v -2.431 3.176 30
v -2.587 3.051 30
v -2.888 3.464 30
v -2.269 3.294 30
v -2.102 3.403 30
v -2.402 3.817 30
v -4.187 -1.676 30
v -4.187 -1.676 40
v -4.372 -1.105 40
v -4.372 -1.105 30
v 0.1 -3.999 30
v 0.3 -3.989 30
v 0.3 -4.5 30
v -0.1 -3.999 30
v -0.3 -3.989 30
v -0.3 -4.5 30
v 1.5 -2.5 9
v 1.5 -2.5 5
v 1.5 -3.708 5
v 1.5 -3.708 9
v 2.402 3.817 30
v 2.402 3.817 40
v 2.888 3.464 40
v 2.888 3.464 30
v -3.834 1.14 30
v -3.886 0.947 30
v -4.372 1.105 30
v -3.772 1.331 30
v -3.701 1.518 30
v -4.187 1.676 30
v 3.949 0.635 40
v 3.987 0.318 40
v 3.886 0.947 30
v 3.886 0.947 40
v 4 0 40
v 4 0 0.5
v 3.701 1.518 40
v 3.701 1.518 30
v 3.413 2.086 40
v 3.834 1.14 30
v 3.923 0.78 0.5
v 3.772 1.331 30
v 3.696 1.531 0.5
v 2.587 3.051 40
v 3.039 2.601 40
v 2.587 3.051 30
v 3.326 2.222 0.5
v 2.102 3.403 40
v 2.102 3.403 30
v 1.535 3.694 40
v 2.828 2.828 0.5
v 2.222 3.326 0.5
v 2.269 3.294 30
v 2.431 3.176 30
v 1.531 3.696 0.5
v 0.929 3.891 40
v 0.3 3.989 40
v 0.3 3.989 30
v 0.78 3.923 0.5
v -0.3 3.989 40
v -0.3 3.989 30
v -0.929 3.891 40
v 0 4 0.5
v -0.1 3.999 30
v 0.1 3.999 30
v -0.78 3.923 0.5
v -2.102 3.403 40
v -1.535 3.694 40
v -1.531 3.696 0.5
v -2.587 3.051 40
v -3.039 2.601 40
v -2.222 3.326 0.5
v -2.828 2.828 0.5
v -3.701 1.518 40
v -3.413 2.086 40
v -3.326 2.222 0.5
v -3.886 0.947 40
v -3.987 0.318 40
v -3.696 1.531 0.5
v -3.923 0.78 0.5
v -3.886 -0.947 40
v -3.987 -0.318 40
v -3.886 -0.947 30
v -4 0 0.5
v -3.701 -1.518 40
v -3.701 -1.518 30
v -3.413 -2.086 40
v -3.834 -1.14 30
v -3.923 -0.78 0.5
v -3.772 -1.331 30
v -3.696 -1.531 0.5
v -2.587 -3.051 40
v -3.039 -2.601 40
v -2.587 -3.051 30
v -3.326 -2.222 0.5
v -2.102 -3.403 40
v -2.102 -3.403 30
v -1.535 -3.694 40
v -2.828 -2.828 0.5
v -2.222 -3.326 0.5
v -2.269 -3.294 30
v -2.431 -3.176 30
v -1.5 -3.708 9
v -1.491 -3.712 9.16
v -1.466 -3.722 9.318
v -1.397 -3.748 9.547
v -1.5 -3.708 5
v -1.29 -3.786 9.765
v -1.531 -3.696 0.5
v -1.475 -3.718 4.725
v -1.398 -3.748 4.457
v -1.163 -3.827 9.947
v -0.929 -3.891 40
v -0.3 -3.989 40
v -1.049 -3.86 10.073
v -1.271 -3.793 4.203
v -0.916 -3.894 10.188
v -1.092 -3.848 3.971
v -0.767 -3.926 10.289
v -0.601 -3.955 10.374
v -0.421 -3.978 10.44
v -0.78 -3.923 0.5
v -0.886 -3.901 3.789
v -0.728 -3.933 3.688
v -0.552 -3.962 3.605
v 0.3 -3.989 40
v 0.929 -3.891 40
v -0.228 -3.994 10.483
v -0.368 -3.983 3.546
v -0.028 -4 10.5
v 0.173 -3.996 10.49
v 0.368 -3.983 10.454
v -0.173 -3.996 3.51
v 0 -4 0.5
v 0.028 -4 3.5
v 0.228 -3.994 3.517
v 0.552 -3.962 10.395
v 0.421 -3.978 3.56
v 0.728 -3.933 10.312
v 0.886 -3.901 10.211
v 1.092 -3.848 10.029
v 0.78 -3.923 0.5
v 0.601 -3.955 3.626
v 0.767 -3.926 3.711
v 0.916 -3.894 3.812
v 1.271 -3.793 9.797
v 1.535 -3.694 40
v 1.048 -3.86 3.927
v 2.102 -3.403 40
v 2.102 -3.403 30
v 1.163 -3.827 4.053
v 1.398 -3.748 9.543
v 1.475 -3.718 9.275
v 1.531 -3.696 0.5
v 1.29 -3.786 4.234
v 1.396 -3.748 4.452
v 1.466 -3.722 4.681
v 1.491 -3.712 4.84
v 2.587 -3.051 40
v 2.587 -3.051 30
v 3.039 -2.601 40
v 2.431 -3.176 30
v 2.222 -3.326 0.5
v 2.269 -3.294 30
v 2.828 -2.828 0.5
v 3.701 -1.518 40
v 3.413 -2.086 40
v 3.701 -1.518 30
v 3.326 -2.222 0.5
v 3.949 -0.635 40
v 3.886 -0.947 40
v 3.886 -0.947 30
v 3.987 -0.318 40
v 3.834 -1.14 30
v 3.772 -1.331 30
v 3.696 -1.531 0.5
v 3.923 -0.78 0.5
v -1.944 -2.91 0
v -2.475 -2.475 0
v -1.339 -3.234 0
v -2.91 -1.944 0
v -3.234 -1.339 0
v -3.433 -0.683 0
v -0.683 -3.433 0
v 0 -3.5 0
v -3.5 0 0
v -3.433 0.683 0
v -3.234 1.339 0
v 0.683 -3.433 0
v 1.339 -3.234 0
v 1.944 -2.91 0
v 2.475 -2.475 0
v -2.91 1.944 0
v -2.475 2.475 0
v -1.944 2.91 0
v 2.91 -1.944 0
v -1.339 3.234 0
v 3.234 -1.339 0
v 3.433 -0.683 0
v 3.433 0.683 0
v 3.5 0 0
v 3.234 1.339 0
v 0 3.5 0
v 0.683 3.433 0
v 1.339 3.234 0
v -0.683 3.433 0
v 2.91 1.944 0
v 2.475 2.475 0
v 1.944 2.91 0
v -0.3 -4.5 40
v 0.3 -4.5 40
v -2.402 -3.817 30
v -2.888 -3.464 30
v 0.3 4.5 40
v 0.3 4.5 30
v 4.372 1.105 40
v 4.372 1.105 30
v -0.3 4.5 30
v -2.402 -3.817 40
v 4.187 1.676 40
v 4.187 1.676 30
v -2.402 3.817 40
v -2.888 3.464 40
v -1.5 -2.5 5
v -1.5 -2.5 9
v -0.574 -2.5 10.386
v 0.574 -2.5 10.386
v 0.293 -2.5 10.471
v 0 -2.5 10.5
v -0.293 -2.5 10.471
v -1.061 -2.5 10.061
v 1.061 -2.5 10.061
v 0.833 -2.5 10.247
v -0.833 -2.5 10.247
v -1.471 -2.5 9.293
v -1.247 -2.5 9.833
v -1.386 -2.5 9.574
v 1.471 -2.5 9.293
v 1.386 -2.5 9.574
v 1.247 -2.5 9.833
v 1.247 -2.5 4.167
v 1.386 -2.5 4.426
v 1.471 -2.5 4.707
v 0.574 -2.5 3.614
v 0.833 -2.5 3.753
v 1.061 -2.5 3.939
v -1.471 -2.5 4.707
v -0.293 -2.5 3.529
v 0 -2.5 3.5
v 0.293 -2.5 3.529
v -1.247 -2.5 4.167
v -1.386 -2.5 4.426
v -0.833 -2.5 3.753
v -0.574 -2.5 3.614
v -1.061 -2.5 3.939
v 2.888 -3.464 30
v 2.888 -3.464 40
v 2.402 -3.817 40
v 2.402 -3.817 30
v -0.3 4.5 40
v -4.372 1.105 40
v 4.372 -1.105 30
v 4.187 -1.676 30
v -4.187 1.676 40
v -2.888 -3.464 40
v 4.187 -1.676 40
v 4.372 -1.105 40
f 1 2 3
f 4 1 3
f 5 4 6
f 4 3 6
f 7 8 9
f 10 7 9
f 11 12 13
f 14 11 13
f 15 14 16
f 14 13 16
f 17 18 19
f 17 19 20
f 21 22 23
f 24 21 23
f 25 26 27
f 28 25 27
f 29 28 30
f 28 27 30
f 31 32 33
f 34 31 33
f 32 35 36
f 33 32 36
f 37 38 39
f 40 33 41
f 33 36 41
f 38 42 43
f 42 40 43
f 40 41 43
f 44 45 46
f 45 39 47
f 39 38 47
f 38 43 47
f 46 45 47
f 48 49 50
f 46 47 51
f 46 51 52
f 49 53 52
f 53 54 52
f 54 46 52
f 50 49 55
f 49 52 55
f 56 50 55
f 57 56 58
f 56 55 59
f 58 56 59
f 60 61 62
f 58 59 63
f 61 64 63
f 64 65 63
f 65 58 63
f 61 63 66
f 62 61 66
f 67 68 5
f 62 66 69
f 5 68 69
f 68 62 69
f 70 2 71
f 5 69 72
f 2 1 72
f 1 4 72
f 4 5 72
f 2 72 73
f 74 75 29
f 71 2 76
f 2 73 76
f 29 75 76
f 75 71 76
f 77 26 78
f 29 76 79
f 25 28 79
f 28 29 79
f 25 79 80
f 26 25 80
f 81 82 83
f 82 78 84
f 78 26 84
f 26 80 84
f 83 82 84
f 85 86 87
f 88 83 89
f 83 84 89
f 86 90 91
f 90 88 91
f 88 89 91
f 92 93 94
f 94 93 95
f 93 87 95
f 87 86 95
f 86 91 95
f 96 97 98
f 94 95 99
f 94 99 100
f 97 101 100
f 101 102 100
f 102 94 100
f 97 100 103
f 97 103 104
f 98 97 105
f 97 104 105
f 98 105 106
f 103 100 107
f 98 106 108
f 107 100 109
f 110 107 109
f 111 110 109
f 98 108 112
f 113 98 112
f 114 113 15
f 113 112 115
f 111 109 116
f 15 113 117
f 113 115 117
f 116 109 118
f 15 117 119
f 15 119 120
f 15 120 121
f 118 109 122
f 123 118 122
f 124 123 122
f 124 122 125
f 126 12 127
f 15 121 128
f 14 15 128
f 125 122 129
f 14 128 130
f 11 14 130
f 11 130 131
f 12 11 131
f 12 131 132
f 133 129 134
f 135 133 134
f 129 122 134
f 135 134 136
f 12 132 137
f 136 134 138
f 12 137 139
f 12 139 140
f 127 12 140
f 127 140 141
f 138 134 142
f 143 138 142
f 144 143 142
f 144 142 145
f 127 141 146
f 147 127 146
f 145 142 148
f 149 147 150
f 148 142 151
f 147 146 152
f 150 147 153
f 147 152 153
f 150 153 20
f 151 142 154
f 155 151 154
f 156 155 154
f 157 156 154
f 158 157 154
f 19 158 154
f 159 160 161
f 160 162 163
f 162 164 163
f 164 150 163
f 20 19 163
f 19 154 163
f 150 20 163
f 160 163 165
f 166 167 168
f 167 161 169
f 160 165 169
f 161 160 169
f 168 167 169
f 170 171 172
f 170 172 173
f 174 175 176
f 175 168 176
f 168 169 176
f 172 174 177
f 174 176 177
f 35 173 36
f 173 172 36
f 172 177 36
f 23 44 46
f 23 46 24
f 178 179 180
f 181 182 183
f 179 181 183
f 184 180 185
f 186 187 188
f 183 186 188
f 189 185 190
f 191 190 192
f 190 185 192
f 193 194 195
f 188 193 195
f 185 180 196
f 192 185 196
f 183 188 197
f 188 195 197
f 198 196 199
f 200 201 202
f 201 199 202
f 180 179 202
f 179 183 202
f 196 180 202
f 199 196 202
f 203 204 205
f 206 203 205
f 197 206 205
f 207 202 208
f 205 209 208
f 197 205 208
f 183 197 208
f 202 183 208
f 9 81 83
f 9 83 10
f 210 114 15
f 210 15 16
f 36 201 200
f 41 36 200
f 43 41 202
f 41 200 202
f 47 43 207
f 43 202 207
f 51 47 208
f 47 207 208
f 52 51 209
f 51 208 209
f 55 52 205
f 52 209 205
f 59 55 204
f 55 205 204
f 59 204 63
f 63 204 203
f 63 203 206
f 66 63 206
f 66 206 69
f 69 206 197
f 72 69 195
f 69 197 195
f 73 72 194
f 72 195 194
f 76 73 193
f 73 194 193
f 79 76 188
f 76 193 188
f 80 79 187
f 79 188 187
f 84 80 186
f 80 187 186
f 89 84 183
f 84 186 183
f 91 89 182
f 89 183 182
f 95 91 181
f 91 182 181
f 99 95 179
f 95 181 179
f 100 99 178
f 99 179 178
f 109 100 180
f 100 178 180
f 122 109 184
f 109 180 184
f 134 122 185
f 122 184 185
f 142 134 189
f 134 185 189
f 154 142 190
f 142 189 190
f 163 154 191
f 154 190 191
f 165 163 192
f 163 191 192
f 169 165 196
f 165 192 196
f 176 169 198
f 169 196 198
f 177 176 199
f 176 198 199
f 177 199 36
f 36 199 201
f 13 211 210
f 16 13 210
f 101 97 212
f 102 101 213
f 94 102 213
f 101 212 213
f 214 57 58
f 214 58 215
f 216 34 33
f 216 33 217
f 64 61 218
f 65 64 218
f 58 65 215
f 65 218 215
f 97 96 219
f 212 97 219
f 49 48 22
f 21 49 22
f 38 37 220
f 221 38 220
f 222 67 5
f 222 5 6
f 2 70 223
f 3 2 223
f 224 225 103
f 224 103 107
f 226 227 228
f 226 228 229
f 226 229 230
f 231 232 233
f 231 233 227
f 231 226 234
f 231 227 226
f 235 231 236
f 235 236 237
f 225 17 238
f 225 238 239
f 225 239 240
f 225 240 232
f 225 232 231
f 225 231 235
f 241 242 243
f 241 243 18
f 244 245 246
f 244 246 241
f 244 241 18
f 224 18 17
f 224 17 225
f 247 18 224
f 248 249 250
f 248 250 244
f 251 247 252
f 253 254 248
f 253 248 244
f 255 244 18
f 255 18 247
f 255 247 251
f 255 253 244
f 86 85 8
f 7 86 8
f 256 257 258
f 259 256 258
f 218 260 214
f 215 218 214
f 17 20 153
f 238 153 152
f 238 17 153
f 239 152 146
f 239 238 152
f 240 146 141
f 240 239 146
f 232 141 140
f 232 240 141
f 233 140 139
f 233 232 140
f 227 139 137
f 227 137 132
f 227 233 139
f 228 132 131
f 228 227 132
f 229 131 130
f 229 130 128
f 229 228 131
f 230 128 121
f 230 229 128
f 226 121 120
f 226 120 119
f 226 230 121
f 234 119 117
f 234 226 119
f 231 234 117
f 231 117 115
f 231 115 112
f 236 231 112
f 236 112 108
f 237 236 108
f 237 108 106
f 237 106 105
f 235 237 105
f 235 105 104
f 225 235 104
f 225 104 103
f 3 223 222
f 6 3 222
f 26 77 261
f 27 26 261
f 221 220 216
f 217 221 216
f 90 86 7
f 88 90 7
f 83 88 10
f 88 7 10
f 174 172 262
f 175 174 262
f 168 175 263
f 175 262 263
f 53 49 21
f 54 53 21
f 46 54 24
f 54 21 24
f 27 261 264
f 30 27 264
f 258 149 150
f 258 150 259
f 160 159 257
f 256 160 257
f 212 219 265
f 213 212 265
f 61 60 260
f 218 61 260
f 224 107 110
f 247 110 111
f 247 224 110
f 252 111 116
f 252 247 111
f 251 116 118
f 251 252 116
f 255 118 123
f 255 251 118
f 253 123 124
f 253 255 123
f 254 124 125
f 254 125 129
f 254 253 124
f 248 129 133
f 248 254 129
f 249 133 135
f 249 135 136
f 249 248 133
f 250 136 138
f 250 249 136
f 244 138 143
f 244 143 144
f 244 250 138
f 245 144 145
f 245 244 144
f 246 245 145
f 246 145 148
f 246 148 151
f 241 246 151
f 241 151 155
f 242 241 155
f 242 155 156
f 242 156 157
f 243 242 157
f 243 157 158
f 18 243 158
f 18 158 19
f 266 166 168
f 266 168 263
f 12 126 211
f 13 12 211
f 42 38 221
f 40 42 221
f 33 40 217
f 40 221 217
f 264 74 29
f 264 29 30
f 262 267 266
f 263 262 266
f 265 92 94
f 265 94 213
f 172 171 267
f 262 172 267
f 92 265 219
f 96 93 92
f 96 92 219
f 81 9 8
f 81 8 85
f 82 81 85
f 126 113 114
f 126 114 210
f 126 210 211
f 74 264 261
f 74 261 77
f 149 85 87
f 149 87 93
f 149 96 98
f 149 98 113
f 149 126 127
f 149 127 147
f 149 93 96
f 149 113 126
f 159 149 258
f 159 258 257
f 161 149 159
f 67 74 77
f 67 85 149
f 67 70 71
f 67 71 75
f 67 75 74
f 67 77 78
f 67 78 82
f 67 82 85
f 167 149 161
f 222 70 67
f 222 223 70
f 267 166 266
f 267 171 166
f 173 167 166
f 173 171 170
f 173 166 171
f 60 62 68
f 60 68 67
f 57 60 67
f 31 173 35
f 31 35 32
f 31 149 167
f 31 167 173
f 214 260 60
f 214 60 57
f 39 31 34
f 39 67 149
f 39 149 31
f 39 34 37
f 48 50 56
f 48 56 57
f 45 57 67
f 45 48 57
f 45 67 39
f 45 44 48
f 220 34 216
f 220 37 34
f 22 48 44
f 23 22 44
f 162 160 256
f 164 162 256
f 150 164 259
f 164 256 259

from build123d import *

# Parameters (mm, degrees)
SKETCH1_R           = 4
BOSS_EXTRUDE1_DEPTH = 40
CUT_EXTRUDE1_START  = -2.5
CUT_EXTRUDE1_DEPTH  = 2.5
SKETCH3_W           = 0.6
SKETCH3_H           = 2.558346845
BOSS_EXTRUDE2_DEPTH = 10
CIRPATTERN1_COUNT   = 10
CHAMFER1_SIZE       = 0.5


with BuildPart() as part:
    # Sketch1 → Boss-Extrude1 (new body)
    with BuildSketch(Plane.XY):
        Circle(SKETCH1_R)
    extrude(amount=BOSS_EXTRUDE1_DEPTH)

    # Sketch2 → Cut-Extrude1 (cut, through all)
    with BuildSketch(Plane(origin=(0, 0, 0), x_dir=(1, 0, 0), z_dir=(0, 1, 0)).offset(CUT_EXTRUDE1_START)):
        with BuildLine():
            Line((1.5, -5), (1.5, -9))
            ThreePointArc((1.5, -9), (0, -10.5), (-1.5, -9))
            Line((-1.5, -9), (-1.5, -5))
            ThreePointArc((-1.5, -5), (0, -3.5), (1.5, -5))
        make_face()
    extrude(amount=-CUT_EXTRUDE1_DEPTH, mode=Mode.SUBTRACT)

    # Sketch3 → Boss-Extrude2 (add)
    with BuildSketch(Plane.XY.offset(40)):
        with Locations((0, 3.220826578)):
            Rectangle(SKETCH3_W, SKETCH3_H)
    boss_extrude2 = extrude(amount=-BOSS_EXTRUDE2_DEPTH)

    # CirPattern1: Boss-Extrude2 ×10 about axis
    cirpattern1_axis = Axis((0, 0, 0), (0, 0, 1))
    for i in range(1, CIRPATTERN1_COUNT):
        add(boss_extrude2.rotate(cirpattern1_axis, i * 360 / CIRPATTERN1_COUNT))

    # Chamfer1
    chamfer1_edges = [part.edges().sort_by_distance(p)[0] for p in [
        (-4, 0, 0),
    ]]
    chamfer(chamfer1_edges, length=CHAMFER1_SIZE)


solid = part.part
